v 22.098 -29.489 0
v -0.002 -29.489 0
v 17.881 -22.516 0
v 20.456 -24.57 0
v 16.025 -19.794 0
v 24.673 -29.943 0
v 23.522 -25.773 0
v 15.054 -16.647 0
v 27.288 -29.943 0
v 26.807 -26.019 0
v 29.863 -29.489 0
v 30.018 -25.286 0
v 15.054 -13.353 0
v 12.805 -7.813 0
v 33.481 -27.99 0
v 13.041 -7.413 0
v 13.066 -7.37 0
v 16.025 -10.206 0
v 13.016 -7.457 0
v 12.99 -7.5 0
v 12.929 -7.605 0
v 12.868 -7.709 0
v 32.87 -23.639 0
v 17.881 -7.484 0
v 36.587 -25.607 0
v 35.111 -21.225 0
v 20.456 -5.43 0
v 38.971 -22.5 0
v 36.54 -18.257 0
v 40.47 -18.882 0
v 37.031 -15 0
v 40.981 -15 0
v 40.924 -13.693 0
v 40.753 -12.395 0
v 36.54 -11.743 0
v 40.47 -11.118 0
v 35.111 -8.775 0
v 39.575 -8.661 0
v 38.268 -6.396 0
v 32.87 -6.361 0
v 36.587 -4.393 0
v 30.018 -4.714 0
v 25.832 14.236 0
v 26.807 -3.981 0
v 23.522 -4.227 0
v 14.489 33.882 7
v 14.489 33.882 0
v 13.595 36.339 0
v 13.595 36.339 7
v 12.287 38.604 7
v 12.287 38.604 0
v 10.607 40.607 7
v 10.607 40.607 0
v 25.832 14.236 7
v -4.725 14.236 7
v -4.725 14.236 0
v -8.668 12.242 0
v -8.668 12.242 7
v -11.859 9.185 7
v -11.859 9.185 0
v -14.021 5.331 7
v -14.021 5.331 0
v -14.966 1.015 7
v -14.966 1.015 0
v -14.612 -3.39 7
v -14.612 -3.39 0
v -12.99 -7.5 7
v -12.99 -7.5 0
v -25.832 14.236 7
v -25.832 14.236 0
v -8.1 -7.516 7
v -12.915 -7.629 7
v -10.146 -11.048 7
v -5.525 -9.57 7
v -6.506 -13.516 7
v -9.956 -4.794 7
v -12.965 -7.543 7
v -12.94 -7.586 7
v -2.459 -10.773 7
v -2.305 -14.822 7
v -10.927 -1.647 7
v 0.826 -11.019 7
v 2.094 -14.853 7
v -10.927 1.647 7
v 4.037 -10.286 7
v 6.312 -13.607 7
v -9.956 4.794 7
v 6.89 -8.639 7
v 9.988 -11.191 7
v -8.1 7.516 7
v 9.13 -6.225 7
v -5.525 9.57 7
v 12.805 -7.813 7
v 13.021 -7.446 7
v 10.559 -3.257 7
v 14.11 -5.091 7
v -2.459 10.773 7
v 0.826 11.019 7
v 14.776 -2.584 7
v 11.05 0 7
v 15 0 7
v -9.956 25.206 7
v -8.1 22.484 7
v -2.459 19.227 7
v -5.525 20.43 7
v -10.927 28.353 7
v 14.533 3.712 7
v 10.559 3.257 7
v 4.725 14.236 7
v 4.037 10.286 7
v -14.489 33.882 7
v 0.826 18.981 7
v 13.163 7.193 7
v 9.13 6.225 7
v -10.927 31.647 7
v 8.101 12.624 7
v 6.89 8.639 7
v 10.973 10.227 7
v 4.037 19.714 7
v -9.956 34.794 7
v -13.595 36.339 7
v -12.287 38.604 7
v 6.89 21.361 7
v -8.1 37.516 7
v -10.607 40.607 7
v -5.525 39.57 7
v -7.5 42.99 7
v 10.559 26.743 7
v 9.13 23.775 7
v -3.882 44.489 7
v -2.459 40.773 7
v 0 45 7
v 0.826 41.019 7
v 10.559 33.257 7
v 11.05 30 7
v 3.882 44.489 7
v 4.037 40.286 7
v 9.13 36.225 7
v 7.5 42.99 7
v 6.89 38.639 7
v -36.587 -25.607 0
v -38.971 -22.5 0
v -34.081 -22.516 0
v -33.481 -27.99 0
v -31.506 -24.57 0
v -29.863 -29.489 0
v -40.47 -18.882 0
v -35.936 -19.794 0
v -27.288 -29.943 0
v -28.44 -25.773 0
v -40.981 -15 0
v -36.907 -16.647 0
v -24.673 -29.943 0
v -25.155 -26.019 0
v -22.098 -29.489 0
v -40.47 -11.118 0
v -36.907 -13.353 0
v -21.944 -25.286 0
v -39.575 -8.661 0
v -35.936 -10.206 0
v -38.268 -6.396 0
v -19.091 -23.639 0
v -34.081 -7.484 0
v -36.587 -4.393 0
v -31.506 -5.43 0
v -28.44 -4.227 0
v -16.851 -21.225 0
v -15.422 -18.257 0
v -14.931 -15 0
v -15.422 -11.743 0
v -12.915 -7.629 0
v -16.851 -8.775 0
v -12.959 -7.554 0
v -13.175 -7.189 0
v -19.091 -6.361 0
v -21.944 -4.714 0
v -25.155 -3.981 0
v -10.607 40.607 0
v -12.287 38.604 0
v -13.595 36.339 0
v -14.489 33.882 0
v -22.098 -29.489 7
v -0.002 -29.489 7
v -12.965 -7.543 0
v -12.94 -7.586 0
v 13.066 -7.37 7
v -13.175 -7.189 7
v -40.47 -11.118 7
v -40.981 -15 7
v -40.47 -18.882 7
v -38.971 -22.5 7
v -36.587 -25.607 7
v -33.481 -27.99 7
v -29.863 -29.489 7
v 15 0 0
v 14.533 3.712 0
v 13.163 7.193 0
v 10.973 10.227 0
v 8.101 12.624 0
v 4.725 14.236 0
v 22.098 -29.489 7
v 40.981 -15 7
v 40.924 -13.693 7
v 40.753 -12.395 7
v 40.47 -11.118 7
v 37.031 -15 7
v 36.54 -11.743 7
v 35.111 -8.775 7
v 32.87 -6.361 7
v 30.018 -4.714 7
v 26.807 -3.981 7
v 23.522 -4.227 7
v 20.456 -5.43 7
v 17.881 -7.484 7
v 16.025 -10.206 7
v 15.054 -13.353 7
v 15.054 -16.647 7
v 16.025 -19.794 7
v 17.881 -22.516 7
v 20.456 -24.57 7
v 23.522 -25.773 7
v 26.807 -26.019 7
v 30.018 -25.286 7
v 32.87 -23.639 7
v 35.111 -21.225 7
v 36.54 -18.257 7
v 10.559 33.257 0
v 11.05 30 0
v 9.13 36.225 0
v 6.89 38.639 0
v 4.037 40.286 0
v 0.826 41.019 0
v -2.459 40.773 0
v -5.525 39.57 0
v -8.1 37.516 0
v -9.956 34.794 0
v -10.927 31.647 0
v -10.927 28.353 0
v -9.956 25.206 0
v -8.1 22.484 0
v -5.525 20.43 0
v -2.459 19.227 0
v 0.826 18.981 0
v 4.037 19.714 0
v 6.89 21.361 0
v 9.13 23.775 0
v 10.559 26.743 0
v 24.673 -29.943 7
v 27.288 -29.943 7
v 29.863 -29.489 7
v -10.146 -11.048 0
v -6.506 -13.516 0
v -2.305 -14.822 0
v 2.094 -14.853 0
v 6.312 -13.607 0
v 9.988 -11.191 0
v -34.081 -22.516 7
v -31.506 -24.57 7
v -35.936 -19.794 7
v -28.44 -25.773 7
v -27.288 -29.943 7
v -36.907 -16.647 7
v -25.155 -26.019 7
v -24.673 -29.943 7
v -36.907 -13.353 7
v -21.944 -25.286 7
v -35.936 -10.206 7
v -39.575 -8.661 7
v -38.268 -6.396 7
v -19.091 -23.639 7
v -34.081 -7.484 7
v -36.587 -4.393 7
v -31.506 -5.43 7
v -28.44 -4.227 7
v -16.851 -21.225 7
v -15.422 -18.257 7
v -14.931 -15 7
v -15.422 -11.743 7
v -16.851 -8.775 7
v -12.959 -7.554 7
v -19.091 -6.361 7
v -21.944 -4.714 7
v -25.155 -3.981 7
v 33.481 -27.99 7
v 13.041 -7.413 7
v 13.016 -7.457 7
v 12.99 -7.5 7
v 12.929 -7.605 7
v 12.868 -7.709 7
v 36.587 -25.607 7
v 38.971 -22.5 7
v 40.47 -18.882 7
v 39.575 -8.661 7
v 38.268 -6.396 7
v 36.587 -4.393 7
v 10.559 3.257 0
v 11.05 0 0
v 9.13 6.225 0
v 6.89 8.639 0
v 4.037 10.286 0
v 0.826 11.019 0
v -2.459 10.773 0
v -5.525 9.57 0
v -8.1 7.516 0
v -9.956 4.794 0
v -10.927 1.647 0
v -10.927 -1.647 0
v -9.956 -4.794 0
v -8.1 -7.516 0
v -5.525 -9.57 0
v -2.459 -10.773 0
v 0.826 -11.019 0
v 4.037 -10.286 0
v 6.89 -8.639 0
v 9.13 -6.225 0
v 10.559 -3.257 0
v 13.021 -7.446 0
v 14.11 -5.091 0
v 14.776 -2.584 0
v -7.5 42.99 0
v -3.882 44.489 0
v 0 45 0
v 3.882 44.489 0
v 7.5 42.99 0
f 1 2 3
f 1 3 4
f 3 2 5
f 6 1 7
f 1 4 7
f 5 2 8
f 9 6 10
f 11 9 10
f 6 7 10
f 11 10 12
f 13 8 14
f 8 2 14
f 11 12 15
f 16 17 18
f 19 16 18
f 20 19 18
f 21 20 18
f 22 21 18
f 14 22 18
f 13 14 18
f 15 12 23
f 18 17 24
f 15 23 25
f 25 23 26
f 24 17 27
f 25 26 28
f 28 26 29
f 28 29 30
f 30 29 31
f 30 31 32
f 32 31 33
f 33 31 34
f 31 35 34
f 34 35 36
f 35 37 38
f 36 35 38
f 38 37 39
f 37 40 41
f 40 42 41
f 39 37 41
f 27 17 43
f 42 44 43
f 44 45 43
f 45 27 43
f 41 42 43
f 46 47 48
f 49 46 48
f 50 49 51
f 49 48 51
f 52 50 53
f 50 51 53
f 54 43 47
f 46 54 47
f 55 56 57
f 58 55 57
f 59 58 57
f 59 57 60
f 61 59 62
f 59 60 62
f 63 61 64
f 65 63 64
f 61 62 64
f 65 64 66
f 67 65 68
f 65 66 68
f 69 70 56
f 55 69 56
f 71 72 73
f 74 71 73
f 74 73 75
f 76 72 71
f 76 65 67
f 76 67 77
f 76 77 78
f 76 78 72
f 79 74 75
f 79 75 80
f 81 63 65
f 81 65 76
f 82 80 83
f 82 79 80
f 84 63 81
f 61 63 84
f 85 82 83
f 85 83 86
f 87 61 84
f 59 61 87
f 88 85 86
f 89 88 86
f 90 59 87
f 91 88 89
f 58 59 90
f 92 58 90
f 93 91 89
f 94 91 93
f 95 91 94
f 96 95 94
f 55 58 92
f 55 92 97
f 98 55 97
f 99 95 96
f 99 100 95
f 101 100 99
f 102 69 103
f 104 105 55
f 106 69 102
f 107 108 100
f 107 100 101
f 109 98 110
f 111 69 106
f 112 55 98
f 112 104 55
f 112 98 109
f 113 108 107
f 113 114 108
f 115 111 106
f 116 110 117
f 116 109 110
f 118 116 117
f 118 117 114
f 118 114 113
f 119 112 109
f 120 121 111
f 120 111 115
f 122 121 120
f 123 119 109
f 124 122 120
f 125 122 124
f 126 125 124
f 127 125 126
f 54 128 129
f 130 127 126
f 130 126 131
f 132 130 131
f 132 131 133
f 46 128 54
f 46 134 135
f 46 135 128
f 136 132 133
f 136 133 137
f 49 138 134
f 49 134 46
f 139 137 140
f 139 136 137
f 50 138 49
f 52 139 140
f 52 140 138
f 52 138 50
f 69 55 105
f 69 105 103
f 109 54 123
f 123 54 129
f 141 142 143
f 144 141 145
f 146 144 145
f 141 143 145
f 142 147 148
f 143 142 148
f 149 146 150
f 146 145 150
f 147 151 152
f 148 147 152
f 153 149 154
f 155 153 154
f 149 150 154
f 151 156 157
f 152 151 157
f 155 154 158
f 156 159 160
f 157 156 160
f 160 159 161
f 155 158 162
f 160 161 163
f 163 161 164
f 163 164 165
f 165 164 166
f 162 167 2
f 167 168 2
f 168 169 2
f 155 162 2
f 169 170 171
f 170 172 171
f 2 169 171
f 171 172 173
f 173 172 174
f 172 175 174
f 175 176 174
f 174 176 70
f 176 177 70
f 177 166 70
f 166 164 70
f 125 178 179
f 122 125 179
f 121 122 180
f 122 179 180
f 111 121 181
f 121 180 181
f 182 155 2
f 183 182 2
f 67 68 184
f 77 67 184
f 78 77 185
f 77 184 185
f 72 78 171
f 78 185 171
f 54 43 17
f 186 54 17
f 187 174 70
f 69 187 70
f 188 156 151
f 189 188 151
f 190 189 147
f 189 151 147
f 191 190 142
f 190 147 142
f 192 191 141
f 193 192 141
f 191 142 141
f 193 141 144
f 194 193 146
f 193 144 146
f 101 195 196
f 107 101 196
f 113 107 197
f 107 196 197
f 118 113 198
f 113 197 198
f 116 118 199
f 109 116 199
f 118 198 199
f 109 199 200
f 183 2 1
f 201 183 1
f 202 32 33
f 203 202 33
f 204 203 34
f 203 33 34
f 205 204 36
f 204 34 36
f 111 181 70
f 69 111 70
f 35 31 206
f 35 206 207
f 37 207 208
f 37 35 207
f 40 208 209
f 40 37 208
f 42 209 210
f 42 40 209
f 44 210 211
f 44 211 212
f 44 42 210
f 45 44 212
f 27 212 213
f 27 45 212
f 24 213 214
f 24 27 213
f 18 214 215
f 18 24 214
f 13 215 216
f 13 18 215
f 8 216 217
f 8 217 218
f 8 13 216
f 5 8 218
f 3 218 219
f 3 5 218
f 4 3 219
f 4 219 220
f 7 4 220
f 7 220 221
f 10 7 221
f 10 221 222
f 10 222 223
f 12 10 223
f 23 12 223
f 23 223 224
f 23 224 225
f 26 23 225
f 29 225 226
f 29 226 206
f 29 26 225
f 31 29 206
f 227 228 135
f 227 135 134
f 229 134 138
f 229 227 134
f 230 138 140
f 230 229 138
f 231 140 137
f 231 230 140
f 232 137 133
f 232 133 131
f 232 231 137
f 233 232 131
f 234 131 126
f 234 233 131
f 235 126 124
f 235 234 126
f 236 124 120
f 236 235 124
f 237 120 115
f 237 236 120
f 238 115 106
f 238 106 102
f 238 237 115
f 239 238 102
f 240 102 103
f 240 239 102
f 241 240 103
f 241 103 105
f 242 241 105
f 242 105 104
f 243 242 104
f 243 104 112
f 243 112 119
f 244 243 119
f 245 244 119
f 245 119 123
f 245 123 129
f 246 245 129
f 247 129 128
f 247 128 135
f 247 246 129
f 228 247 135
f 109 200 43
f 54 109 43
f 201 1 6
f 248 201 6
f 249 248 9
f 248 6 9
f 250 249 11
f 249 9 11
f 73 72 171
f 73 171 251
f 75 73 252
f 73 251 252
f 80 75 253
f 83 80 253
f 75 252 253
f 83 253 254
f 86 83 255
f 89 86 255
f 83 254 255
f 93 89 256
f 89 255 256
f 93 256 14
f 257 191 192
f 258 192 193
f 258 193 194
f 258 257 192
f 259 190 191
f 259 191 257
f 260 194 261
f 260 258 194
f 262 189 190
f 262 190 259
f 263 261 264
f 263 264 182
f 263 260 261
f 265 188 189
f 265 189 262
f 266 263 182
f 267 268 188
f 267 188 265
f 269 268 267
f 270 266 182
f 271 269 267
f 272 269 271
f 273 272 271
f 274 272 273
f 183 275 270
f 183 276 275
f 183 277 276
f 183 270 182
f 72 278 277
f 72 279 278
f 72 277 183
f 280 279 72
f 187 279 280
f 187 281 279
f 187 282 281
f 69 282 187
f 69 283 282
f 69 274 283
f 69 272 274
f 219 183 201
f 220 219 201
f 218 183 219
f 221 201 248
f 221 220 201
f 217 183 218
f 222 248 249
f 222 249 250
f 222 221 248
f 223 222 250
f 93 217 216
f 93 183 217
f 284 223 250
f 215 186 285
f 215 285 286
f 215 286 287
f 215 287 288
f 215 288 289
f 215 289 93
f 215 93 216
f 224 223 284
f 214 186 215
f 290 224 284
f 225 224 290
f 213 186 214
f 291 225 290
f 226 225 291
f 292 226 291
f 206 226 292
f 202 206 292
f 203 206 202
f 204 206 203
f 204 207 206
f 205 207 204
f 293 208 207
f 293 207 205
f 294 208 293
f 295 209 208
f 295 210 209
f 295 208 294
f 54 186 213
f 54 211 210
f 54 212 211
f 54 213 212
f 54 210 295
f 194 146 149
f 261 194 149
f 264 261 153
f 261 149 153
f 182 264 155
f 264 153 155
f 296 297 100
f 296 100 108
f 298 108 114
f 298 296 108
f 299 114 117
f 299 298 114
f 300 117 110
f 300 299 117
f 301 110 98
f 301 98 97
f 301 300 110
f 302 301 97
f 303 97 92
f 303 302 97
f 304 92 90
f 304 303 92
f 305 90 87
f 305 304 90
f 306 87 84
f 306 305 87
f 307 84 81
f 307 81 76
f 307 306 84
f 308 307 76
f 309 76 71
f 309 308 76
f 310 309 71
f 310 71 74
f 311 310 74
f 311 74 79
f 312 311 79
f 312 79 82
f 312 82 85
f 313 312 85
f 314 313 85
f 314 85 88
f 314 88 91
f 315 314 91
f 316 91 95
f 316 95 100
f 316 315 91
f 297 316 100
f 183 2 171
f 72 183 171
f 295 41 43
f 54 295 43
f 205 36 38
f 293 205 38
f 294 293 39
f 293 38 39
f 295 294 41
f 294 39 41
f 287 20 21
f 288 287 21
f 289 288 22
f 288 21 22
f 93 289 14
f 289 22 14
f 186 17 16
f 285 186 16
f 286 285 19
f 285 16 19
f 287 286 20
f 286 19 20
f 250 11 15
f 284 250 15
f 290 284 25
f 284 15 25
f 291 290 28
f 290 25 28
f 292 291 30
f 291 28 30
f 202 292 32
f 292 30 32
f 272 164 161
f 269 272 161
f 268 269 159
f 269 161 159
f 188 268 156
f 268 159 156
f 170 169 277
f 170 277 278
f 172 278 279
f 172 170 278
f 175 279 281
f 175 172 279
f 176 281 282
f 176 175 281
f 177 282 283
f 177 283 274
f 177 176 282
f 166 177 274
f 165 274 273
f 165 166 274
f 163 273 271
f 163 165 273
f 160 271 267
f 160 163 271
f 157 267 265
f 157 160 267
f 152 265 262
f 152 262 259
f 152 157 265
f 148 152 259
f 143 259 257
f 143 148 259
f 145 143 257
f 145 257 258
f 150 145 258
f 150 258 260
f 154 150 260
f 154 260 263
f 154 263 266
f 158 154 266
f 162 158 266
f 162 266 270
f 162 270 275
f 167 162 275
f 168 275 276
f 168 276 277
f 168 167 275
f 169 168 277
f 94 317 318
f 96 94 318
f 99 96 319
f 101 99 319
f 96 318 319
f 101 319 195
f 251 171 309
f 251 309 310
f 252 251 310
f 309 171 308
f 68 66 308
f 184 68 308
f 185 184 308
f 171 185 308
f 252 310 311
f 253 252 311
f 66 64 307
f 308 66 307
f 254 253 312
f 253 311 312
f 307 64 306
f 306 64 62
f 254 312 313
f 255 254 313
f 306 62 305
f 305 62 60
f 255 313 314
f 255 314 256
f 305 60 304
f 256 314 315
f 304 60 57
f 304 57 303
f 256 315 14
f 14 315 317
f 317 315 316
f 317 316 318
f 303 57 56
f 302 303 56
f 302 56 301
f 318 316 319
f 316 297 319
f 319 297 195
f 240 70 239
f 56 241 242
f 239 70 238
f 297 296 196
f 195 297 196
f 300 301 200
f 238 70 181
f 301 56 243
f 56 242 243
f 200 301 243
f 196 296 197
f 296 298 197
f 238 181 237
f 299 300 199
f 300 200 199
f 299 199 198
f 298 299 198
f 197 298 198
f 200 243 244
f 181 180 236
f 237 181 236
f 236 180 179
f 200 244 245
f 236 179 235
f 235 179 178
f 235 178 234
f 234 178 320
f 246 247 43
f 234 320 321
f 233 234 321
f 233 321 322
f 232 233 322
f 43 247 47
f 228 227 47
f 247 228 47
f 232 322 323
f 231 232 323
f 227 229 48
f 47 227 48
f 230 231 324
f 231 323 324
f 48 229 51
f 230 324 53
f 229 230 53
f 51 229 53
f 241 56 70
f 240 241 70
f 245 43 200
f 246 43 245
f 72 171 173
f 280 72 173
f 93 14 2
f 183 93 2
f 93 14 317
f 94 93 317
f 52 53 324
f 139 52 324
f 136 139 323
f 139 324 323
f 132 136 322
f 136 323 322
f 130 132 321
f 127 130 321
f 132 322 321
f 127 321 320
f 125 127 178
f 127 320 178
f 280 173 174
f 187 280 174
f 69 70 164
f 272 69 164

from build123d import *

# Parameters (mm, degrees)
F0_R     = 11.05
F1_DEPTH = 7


with BuildPart() as f1:
    # F0 (on Top) → F1 (new body)
    with BuildSketch(Plane.XY):
        with BuildLine():
            Line((10.6066017178, 40.6066017178), (14.4888873943, 33.8822856765))
            ThreePointArc((14.4888873943, 33.8822856765), (12.9903810568, 37.5), (10.6066017178, 40.6066017178))
        make_face()
        with BuildLine():
            ThreePointArc((-10.6066017178, 40.6066017178), (-12.9903810568, 37.5), (-14.4888873943, 33.8822856765))
            Line((-14.4888873943, 33.8822856765), (-10.6066017178, 40.6066017178))
        make_face()
        with BuildLine():
            ThreePointArc((0, 15), (2.3933095573, 14.8078381057), (4.7252987281, 14.2362759151))
            Line((4.7252987281, 14.2362759151), (25.8315164186, 14.2362759151))
            Line((25.8315164186, 14.2362759151), (14.4888873943, 33.8822856765))
            ThreePointArc((14.4888873943, 33.8822856765), (14.8716729206, 31.9578928833), (15, 30))
            ThreePointArc((15, 30), (10.6066017178, 19.3933982822), (0, 15))
        make_face()
        with BuildLine():
            ThreePointArc((-4.7252987281, 14.2362759151), (-2.3933095573, 14.8078381057), (0, 15))
            ThreePointArc((0, 15), (-11.9003001044, 20.8685785649), (-14.4888873943, 33.8822856765))
            Line((-14.4888873943, 33.8822856765), (-25.8315164186, 14.2362759151))
            Line((-25.8315164186, 14.2362759151), (-4.7252987281, 14.2362759151))
        make_face()
        with BuildLine():
            ThreePointArc((-14.4888873943, 33.8822856765), (-11.9003001044, 20.8685785649), (0, 15))
            ThreePointArc((0, 15), (10.6066017178, 19.3933982822), (15, 30))
            ThreePointArc((15, 30), (14.8716729206, 31.9578928833), (14.4888873943, 33.8822856765))
            Line((14.4888873943, 33.8822856765), (10.6066017178, 40.6066017178))
            ThreePointArc((10.6066017178, 40.6066017178), (0, 45), (-10.6066017178, 40.6066017178))
            Line((-10.6066017178, 40.6066017178), (-14.4888873943, 33.8822856765))
        make_face()
        with Locations((0, 30)):
            Circle(F0_R, mode=Mode.SUBTRACT)
        with BuildLine():
            ThreePointArc((13.021447299, -7.4459324626), (14.4969256997, -3.8521611152), (15, 0))
            ThreePointArc((15, 0), (12.1630481566, 8.7783973218), (4.7252987281, 14.2362759151))
            Line((4.7252987281, 14.2362759151), (-4.7252987281, 14.2362759151))
            ThreePointArc((-4.7252987281, 14.2362759151), (-14.0206187409, 5.3312522095), (-12.9903810914, -7.49999994))
            ThreePointArc((-12.9903810914, -7.49999994), (-12.9528074644, -7.5647061272), (-12.914911533, -7.6292240821))
            ThreePointArc((-12.914911533, -7.6292240821), (-0.1068947331, -14.9996191124), (12.8048660264, -7.8125159869))
            Line((12.8048660264, -7.8125159869), (13.021447299, -7.4459324626))
        make_face()
        Circle(F0_R, mode=Mode.SUBTRACT)
        with BuildLine():
            Line((-4.7252987281, 14.2362759151), (4.7252987281, 14.2362759151))
            ThreePointArc((4.7252987281, 14.2362759151), (2.3933095573, 14.8078381057), (0, 15))
            ThreePointArc((0, 15), (-2.3933095573, 14.8078381057), (-4.7252987281, 14.2362759151))
        make_face()
    extrude(amount=F1_DEPTH)


with BuildPart() as f1b:
    # F0 (on Top) → F1, piece 2 (new body)
    with BuildSketch(Plane.XY):
        with BuildLine():
            Line((-40.4696495079, -11.1177143235), (-36.5873638313, -4.3933982822))
            ThreePointArc((-36.5873638313, -4.3933982822), (-38.9711431703, -7.5), (-40.4696495079, -11.1177143235))
        make_face()
        with BuildLine():
            ThreePointArc((-29.8630477901, -29.4888873943), (-25.9807621135, -30), (-22.098476437, -29.4888873943))
            Line((-22.098476437, -29.4888873943), (-29.8630477901, -29.4888873943))
        make_face()
        with BuildLine():
            Line((-13.1747741501, -7.1893231869), (-25.8315164186, 14.2362759151))
            Line((-25.8315164186, 14.2362759151), (-36.5873638313, -4.3933982822))
            ThreePointArc((-36.5873638313, -4.3933982822), (-24.2021041974, -0.1058274477), (-13.1747741501, -7.1893231869))
        make_face()
        with BuildLine():
            Line((-0.0017545518, -29.4888873943), (-12.914911533, -7.6292240821))
            Line((-12.914911533, -7.6292240821), (-12.9594983082, -7.5537466528))
            ThreePointArc((-12.9594983082, -7.5537466528), (-11.4838838792, -11.1476602616), (-10.9807621135, -15))
            ThreePointArc((-10.9807621135, -15), (-14.0804620092, -24.1314214351), (-22.098476437, -29.4888873943))
            Line((-22.098476437, -29.4888873943), (-0.0017545518, -29.4888873943))
        make_face()
        with BuildLine():
            ThreePointArc((-10.9807621135, -15), (-11.4838838792, -11.1476602616), (-12.9594983082, -7.5537466528))
            Line((-12.9594983082, -7.5537466528), (-13.1747741501, -7.1893231869))
            ThreePointArc((-13.1747741501, -7.1893231869), (-24.2021041974, -0.1058274477), (-36.5873638313, -4.3933982822))
            Line((-36.5873638313, -4.3933982822), (-40.4696495079, -11.1177143235))
            ThreePointArc((-40.4696495079, -11.1177143235), (-38.9711431703, -22.5), (-29.8630477901, -29.4888873943))
            Line((-29.8630477901, -29.4888873943), (-22.098476437, -29.4888873943))
            ThreePointArc((-22.098476437, -29.4888873943), (-14.0804620092, -24.1314214351), (-10.9807621135, -15))
        make_face()
        with Locations((-25.9807621135, -15)):
            Circle(F0_R, mode=Mode.SUBTRACT)
    extrude(amount=F1_DEPTH)


with BuildPart() as f1c:
    # F0 (on Top) → F1, piece 3 (new body)
    with BuildSketch(Plane.XY):
        with BuildLine():
            ThreePointArc((40.4696495079, -11.1177143235), (38.9711431703, -7.5), (36.5873638313, -4.3933982822))
            Line((36.5873638313, -4.3933982822), (40.4696495079, -11.1177143235))
        make_face()
        with BuildLine():
            Line((29.8630477901, -29.4888873943), (22.098476437, -29.4888873943))
            ThreePointArc((22.098476437, -29.4888873943), (25.9807621135, -30), (29.8630477901, -29.4888873943))
        make_face()
        with BuildLine():
            Line((36.5873638313, -4.3933982822), (25.8315164186, 14.2362759151))
            Line((25.8315164186, 14.2362759151), (13.0663046971, -7.370007232))
            ThreePointArc((13.0663046971, -7.370007232), (24.0975203098, -0.1186895635), (36.5873638313, -4.3933982822))
        make_face()
        with BuildLine():
            ThreePointArc((22.098476437, -29.4888873943), (12.1225691126, -20.7402514535), (12.9903810914, -7.49999994))
            ThreePointArc((12.9903810914, -7.49999994), (12.8985700772, -7.6568198335), (12.8048660264, -7.8125159869))
            Line((12.8048660264, -7.8125159869), (-0.0017545518, -29.4888873943))
            Line((-0.0017545518, -29.4888873943), (22.098476437, -29.4888873943))
        make_face()
        with BuildLine():
            ThreePointArc((13.0663046971, -7.370007232), (13.0281798167, -7.4349083388), (12.9903810914, -7.49999994))
            ThreePointArc((12.9903810914, -7.49999994), (12.1225691126, -20.7402514535), (22.098476437, -29.4888873943))
            Line((22.098476437, -29.4888873943), (29.8630477901, -29.4888873943))
            ThreePointArc((29.8630477901, -29.4888873943), (37.8810622179, -24.1314214351), (40.9807621135, -15))
            ThreePointArc((40.9807621135, -15), (40.8524350341, -13.0421071167), (40.4696495079, -11.1177143235))
            Line((40.4696495079, -11.1177143235), (36.5873638313, -4.3933982822))
            ThreePointArc((36.5873638313, -4.3933982822), (24.0975203098, -0.1186895635), (13.0663046971, -7.370007232))
        make_face()
        with Locations((25.9807621135, -15)):
            Circle(F0_R, mode=Mode.SUBTRACT)
    extrude(amount=F1_DEPTH)


solid = Compound([f1.part, f1b.part, f1c.part])
